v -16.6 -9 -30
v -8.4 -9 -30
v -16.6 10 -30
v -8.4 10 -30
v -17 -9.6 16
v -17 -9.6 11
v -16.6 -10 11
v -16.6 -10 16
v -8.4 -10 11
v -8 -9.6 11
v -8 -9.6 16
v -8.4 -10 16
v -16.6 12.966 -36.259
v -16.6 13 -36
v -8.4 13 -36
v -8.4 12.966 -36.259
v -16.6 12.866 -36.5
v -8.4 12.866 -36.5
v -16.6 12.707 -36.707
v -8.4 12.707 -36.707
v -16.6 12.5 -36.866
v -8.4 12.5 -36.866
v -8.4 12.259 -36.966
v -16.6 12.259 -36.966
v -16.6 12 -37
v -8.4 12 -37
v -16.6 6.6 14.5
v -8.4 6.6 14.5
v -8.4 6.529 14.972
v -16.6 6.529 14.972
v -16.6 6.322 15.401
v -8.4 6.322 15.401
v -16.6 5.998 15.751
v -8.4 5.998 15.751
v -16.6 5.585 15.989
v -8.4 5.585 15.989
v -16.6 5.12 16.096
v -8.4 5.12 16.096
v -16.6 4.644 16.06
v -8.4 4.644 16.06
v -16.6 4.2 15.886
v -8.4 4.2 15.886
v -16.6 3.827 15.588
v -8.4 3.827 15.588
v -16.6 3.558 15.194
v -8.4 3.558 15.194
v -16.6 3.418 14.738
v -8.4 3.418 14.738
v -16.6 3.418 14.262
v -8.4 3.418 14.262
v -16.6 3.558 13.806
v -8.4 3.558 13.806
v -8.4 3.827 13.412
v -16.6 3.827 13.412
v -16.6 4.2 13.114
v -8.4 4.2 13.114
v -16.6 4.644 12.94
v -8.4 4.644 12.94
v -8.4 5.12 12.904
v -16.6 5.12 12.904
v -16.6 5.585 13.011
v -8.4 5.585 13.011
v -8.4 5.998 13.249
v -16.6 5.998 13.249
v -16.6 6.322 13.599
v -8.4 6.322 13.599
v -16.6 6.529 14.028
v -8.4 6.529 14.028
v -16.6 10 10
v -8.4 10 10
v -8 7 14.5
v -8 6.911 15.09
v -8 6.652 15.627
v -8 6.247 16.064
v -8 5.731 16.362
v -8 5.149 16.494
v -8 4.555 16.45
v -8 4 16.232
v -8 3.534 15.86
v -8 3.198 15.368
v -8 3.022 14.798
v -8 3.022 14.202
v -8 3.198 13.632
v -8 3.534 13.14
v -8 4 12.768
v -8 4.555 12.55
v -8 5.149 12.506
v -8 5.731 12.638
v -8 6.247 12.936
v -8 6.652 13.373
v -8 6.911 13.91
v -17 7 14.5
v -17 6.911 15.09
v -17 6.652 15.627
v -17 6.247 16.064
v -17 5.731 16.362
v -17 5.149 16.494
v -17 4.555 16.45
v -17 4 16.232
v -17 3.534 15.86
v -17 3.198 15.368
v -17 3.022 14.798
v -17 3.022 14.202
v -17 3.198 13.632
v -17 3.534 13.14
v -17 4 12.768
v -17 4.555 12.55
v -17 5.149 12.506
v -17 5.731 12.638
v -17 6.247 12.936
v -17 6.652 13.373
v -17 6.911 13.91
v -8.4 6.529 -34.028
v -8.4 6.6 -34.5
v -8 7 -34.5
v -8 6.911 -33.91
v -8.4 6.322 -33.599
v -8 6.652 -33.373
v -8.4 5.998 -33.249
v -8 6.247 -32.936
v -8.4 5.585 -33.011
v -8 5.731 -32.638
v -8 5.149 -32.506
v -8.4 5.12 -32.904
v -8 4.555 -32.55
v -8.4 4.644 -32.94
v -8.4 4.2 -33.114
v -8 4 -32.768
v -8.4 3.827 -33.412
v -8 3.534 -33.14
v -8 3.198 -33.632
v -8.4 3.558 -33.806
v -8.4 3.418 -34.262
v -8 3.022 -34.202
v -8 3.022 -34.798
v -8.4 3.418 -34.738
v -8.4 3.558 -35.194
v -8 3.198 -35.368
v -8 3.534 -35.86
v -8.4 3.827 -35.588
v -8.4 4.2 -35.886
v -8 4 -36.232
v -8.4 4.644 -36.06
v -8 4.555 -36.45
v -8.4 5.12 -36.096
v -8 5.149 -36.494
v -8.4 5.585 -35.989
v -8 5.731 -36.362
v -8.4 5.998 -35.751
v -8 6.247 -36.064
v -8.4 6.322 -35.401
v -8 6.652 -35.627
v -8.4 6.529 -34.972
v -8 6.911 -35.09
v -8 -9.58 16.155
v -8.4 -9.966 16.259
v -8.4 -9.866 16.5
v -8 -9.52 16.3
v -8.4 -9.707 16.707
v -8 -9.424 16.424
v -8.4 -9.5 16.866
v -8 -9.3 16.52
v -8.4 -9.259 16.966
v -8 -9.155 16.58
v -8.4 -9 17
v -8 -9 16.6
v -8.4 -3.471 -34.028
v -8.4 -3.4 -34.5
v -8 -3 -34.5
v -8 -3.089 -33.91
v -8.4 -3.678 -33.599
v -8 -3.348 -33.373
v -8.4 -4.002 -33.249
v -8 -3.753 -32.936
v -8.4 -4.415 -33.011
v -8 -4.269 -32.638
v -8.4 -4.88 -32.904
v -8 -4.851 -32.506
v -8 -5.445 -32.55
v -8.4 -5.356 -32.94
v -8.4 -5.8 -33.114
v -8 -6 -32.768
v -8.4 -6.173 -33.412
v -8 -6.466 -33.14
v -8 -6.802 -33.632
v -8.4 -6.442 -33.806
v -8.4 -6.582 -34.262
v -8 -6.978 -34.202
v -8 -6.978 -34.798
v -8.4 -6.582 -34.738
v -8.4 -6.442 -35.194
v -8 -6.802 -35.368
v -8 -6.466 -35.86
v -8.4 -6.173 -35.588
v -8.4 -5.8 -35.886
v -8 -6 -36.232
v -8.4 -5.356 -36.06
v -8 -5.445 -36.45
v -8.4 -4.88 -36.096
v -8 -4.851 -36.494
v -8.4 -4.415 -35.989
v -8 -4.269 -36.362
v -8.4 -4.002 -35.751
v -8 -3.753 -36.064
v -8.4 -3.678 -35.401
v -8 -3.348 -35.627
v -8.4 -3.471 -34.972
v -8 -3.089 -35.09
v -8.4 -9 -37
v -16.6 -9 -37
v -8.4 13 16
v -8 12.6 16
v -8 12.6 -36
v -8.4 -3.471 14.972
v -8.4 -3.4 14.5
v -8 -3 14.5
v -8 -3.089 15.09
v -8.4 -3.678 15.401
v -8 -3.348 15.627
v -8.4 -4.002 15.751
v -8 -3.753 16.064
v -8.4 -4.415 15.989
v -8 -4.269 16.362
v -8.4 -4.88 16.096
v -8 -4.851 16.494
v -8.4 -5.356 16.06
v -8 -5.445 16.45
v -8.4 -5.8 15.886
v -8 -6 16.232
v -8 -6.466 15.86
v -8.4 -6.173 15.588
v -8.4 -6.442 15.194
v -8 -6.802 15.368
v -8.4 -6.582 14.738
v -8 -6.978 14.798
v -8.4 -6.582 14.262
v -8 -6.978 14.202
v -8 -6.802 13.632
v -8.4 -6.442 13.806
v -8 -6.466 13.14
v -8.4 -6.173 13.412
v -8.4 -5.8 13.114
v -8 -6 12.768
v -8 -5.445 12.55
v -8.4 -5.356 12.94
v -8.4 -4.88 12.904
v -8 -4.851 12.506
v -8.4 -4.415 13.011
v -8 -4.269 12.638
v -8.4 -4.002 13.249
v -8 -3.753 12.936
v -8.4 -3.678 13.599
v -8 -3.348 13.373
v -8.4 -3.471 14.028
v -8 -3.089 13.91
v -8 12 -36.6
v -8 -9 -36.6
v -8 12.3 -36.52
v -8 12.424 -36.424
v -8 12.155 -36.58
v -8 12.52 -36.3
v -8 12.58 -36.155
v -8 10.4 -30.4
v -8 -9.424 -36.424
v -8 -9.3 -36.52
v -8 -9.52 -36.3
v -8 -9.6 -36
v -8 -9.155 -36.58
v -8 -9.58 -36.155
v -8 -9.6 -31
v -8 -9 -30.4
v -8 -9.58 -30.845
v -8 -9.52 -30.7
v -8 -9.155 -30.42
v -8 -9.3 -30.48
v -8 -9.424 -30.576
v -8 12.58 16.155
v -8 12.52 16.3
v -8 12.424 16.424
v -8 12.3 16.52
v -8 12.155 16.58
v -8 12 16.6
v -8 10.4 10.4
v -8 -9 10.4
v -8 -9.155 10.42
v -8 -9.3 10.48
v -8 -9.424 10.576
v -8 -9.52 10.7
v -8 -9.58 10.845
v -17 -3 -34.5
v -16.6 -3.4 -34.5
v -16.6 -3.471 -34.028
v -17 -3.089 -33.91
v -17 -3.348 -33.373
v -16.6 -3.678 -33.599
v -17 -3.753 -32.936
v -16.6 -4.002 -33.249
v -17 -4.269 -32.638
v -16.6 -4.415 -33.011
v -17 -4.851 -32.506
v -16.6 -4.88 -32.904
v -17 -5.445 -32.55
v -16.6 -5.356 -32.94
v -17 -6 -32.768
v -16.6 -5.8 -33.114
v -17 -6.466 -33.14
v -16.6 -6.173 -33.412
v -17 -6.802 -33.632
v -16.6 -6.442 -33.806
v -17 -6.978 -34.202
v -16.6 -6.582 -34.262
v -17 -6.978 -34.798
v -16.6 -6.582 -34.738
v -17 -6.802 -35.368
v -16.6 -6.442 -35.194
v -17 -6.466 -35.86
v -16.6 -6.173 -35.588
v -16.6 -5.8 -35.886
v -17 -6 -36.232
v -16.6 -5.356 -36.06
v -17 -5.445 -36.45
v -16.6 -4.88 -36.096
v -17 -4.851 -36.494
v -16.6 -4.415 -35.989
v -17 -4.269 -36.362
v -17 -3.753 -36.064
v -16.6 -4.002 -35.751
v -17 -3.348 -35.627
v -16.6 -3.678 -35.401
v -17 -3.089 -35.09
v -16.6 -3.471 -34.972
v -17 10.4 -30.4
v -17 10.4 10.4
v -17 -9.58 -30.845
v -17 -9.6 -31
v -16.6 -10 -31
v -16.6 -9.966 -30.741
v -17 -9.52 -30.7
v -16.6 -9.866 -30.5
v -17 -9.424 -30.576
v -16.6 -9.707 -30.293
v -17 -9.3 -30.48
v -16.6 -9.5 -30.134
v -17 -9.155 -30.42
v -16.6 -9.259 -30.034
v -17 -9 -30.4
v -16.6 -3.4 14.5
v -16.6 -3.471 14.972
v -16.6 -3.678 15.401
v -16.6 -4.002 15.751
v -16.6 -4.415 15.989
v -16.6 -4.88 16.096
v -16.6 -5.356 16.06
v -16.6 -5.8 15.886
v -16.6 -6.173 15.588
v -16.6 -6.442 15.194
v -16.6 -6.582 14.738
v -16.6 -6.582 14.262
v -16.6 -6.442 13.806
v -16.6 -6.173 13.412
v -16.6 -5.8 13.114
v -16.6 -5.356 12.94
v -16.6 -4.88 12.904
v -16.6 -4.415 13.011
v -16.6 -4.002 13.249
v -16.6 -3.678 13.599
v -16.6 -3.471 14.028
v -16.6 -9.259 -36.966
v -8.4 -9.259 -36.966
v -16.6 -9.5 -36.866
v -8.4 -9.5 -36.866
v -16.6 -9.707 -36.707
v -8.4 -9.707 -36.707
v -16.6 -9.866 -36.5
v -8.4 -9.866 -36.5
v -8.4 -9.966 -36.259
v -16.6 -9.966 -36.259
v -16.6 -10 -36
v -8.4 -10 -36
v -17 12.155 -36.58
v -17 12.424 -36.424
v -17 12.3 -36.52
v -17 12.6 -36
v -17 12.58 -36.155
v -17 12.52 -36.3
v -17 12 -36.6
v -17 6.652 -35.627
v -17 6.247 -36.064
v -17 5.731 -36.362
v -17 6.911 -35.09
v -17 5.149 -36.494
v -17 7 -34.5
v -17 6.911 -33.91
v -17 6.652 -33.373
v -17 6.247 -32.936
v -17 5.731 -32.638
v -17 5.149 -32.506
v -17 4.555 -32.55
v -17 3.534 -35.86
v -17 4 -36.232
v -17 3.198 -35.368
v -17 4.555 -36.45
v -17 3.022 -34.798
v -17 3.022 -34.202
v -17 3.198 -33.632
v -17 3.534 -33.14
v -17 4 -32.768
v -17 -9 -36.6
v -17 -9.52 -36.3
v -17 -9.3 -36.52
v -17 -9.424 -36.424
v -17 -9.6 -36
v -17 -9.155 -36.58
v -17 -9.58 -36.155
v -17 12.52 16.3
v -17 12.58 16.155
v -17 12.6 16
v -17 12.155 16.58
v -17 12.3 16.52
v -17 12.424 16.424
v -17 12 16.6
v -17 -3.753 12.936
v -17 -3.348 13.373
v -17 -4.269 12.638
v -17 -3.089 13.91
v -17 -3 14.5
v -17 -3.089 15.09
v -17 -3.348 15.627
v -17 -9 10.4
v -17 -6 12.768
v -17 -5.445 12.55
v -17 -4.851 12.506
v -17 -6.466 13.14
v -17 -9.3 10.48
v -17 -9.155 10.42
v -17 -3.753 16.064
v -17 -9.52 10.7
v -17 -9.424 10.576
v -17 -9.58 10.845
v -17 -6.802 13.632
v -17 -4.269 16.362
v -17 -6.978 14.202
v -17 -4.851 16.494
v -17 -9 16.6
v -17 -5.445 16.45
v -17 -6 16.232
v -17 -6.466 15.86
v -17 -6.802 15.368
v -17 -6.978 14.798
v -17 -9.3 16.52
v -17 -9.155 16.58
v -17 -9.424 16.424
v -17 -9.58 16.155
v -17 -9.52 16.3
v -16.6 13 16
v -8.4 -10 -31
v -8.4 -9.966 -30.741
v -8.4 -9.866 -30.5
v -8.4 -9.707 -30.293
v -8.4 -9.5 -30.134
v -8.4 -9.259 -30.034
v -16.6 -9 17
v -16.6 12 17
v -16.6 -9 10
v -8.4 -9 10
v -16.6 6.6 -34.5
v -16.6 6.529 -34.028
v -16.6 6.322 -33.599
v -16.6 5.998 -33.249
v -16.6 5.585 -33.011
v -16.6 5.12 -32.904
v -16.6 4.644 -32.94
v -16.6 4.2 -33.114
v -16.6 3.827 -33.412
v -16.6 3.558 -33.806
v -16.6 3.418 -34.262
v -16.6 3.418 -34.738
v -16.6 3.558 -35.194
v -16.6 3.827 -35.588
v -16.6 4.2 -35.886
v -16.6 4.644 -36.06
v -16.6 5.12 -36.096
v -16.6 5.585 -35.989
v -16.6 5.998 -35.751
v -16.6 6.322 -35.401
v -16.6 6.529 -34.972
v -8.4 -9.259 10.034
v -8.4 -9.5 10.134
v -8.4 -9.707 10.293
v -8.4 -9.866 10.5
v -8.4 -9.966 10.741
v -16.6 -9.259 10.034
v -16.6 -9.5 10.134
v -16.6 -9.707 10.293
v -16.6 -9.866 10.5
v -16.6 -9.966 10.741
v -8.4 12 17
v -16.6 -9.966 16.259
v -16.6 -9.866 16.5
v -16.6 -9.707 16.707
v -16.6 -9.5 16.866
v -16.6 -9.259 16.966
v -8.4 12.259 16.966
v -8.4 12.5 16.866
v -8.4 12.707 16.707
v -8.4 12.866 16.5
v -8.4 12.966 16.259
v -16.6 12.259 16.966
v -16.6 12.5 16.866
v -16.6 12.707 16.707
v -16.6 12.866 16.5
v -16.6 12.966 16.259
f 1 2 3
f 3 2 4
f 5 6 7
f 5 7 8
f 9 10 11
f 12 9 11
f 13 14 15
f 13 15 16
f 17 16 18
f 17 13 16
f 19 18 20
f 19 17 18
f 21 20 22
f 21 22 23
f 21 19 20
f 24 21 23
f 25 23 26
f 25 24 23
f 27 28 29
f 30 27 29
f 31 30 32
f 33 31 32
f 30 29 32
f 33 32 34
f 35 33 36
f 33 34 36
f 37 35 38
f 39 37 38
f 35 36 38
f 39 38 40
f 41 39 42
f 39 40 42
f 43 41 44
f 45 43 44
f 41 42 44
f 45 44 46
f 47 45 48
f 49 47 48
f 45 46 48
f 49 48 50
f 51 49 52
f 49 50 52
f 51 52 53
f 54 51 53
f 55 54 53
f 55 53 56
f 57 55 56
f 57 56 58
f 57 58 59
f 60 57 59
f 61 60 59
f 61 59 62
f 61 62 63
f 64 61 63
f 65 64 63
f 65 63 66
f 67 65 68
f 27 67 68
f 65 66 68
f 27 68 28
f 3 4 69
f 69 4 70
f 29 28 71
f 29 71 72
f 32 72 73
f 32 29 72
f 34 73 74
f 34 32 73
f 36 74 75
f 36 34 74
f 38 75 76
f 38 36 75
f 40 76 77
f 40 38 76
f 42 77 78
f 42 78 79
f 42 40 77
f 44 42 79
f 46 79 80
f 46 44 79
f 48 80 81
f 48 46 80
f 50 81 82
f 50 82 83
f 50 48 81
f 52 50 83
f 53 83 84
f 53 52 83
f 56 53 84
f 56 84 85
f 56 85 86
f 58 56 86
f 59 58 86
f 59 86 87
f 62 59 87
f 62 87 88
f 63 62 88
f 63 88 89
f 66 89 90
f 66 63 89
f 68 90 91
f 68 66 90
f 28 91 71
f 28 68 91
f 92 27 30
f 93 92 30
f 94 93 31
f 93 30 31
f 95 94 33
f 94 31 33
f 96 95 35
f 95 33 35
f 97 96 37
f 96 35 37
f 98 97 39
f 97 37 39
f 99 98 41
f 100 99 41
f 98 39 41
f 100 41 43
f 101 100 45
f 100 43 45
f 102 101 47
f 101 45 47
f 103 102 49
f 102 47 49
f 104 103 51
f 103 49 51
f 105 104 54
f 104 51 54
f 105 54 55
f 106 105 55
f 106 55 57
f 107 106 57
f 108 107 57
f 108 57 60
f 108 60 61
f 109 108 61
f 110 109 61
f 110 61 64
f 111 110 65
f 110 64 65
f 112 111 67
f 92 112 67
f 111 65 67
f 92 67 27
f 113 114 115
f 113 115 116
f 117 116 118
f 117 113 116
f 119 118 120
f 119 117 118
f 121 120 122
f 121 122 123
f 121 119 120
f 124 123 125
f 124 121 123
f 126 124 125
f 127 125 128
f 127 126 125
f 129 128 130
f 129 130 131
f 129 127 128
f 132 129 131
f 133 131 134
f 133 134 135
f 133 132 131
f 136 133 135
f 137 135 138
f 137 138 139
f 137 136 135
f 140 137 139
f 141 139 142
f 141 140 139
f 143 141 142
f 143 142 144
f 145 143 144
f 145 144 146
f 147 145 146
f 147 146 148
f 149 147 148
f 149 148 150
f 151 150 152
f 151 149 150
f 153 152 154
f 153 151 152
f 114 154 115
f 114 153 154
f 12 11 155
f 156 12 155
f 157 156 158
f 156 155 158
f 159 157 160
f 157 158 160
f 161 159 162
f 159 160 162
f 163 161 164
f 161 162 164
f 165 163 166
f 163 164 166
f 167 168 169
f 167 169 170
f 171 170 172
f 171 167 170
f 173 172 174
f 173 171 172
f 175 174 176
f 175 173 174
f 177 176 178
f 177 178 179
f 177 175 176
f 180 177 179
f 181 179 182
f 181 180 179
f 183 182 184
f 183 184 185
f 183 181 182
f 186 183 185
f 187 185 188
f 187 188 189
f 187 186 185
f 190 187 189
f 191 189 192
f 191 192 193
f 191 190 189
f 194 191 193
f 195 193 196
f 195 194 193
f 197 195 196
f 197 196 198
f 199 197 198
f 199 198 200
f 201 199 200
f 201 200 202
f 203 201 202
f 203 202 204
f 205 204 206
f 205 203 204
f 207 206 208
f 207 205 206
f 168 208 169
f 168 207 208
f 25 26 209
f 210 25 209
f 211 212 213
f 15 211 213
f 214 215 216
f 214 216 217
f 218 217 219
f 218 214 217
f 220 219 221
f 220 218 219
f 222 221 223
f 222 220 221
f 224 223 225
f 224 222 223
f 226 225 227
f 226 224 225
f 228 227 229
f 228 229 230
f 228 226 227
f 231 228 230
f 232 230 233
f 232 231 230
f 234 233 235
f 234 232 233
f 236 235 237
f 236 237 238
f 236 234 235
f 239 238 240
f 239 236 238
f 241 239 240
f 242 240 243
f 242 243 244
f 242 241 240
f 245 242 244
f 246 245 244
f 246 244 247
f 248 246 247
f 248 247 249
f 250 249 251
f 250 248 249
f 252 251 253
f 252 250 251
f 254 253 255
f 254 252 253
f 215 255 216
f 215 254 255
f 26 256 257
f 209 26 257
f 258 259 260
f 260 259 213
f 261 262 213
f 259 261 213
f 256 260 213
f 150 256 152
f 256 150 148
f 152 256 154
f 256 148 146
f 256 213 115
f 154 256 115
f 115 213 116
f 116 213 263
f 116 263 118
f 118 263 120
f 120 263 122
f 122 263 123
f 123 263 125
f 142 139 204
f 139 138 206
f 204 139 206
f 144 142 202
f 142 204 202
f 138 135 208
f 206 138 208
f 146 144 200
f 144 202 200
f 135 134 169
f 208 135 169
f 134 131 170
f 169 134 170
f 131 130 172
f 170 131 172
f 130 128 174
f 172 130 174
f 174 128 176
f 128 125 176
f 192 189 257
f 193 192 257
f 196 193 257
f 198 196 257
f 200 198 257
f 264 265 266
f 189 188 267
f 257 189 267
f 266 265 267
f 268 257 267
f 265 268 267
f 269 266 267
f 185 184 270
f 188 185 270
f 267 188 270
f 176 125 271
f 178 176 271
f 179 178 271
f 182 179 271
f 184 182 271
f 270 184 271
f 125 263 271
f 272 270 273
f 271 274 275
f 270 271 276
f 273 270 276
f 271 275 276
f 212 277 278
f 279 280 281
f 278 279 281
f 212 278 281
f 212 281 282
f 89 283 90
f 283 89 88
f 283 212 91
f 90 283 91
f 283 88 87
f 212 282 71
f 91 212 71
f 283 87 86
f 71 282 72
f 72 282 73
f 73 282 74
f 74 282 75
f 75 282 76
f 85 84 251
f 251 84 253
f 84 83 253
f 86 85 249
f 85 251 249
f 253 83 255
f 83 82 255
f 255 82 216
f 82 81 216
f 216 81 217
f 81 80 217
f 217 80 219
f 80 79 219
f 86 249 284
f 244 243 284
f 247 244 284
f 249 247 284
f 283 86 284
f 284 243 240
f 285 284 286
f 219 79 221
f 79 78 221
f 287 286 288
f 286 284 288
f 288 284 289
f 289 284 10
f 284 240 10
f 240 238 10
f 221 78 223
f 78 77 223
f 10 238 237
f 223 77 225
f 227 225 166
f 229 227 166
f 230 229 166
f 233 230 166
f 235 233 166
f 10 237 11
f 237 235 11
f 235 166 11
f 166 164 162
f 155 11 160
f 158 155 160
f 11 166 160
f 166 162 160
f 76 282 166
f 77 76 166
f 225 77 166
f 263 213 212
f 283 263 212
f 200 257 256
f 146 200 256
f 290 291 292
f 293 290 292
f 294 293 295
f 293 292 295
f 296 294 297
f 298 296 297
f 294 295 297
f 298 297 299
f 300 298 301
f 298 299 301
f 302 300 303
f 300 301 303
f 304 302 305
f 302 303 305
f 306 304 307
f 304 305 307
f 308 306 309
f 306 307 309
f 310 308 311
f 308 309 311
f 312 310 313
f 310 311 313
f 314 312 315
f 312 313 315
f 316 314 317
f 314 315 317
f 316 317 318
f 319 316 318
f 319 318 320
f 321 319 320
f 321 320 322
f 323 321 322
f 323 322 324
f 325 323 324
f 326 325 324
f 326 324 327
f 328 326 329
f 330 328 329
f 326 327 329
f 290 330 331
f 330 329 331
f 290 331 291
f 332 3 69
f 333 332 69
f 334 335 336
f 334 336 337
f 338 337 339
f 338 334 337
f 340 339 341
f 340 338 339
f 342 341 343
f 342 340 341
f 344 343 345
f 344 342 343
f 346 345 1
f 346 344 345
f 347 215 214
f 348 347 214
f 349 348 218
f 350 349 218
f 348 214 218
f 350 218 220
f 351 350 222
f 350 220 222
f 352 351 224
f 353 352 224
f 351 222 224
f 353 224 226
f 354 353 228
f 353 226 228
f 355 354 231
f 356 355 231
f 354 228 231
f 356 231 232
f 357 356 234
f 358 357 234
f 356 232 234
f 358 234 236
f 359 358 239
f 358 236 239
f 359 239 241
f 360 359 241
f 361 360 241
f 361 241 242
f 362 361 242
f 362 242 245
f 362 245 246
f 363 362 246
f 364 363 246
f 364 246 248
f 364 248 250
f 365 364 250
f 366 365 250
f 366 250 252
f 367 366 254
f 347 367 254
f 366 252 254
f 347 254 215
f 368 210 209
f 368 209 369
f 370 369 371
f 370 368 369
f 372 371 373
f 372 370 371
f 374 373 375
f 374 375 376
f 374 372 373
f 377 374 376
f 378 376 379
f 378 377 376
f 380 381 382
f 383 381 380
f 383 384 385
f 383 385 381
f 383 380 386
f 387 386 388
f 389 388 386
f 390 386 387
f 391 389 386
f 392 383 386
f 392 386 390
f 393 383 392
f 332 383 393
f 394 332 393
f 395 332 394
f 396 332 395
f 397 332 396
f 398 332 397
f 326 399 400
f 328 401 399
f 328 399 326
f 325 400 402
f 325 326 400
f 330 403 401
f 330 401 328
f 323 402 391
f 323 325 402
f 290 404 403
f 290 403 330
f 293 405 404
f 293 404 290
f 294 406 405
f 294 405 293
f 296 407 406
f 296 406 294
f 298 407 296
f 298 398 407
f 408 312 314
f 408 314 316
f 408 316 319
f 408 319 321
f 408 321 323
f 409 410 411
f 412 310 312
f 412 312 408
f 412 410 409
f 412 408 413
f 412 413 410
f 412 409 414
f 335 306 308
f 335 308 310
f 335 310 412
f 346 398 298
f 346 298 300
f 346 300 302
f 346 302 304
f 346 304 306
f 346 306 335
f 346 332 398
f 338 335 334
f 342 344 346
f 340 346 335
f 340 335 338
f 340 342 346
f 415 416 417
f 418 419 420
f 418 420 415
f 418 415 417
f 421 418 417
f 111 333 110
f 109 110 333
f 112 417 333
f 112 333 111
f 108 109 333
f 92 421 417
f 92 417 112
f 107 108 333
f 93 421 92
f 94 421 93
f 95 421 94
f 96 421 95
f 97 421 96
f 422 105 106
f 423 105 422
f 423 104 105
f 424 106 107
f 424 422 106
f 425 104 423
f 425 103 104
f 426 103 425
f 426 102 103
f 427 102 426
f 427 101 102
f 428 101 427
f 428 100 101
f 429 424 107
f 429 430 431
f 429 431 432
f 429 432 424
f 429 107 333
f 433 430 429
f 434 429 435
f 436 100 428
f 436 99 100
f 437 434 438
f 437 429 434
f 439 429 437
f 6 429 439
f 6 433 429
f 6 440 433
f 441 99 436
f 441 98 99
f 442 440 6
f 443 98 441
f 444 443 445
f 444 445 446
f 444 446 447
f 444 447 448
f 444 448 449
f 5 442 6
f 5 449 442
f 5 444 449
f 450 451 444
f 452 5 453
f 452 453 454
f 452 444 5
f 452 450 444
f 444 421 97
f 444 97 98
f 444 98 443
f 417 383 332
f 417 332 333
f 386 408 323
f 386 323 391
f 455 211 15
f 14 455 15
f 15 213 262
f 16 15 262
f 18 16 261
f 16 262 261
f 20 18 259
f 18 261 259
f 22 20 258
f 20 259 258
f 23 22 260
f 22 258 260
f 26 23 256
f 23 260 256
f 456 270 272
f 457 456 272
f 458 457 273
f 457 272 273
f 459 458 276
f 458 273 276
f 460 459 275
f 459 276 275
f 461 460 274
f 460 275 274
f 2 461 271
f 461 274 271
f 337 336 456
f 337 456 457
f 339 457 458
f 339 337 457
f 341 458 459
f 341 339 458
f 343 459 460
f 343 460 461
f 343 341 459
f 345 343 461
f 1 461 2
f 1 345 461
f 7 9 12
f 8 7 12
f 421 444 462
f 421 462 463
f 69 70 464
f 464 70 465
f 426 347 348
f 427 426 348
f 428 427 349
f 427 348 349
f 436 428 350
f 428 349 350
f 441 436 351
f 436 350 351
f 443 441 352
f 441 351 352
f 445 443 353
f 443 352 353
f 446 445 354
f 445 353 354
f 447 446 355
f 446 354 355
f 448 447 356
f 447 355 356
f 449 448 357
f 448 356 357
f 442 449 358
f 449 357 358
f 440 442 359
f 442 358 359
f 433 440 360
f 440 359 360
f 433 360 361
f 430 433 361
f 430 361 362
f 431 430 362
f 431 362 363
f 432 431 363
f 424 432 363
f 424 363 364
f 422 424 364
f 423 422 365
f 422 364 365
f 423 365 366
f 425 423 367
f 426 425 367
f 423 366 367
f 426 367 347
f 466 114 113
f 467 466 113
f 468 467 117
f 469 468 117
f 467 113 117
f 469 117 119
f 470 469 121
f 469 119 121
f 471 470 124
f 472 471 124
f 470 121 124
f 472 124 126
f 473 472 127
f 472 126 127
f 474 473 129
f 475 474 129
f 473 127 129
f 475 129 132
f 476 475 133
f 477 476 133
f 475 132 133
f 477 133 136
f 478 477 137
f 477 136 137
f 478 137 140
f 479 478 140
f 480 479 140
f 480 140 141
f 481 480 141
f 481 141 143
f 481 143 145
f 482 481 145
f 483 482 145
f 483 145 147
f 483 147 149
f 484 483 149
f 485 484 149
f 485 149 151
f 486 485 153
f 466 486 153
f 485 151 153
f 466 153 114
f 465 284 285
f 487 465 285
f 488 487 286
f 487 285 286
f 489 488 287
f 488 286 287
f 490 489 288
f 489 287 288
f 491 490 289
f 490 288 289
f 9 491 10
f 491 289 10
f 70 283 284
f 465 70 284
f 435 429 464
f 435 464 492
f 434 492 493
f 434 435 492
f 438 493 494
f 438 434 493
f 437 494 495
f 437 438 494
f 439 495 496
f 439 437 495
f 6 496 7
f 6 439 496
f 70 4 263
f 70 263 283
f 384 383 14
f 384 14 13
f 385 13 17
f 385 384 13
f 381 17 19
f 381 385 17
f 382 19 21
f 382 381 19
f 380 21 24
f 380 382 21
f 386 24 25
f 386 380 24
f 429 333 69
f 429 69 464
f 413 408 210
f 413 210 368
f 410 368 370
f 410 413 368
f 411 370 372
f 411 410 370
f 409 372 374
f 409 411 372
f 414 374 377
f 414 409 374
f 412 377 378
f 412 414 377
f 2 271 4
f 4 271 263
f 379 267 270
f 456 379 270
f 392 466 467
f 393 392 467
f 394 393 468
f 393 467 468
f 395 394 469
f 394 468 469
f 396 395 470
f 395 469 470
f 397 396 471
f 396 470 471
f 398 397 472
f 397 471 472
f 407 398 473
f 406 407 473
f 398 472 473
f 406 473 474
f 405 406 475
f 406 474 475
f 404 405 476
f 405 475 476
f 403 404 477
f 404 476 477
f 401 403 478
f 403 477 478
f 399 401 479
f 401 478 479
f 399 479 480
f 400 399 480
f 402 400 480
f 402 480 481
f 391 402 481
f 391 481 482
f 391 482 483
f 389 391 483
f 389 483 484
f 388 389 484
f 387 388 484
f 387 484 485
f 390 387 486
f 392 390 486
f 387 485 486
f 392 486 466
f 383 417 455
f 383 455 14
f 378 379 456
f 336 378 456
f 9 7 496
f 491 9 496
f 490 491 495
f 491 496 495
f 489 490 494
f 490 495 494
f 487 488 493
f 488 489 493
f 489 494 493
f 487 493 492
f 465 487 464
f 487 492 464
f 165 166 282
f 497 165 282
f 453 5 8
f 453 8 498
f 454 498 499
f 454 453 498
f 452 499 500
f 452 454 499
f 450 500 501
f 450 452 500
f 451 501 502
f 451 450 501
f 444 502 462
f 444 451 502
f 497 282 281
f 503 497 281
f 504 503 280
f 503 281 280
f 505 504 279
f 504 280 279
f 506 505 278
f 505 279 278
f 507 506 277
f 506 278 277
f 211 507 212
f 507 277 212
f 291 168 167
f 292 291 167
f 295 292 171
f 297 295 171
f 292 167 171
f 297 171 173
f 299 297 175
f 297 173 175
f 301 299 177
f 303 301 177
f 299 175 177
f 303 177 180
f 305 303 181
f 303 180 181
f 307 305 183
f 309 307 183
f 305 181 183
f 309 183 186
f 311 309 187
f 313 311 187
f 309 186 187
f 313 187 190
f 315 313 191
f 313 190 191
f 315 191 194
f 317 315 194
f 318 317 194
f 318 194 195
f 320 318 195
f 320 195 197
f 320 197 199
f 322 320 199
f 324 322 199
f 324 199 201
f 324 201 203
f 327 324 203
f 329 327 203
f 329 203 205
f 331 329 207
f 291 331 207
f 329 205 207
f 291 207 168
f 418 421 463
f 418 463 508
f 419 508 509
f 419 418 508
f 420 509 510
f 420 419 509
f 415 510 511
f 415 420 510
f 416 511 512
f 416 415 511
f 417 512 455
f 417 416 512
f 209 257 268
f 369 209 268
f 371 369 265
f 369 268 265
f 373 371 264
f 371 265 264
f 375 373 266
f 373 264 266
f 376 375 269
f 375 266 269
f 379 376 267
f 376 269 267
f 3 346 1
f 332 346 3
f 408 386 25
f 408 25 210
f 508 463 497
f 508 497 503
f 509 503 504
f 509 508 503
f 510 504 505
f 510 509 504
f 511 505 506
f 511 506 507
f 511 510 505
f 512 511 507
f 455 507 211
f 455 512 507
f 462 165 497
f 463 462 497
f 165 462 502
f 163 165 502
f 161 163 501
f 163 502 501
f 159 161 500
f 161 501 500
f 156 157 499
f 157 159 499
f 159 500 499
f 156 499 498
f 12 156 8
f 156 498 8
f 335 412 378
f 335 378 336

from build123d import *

# Parameters (mm, degrees)
SKETCH044_R     = 1.6
PAD025_DEPTH    = 9
FILLET013_R     = 1
CHAMFER007_SIZE = 0.4


with BuildPart() as part:
    # Sketch044 → Pad025 (new body)
    with BuildSketch(Plane.YZ):
        Polygon((-10, 17), (13, 17), (13, -37), (-10, -37), (-10, -30), (10, -30), (10, 10), (-10, 10), align=None)
        with Locations((-5, 14.5)):
            Circle(SKETCH044_R, mode=Mode.SUBTRACT)
        with Locations((5, 14.5)):
            Circle(SKETCH044_R, mode=Mode.SUBTRACT)
        with Locations((-5, -34.5)):
            Circle(SKETCH044_R, mode=Mode.SUBTRACT)
        with Locations((5, -34.5)):
            Circle(SKETCH044_R, mode=Mode.SUBTRACT)
    extrude(amount=-PAD025_DEPTH)

    # Fillet013
    fillet013_edges = [part.edges().sort_by_distance(p)[0] for p in [
        (-4.5, -10, 17),
        (-4.5, -10, 10),
        (-4.5, -10, -30),
        (-4.5, -10, -37),
        (-4.5, 13, -37),
        (-4.5, 13, 17),
    ]]
    fillet(fillet013_edges, radius=FILLET013_R)

    # Chamfer007
    chamfer007_edges = [part.edges().sort_by_distance(p)[0] for p in [
        (0, 1.5, 17),
        (0, -9.707107, 16.707107),
        (0, 12.707107, 16.707107),
        (0, -10, 13.5),
        (0, 13, -10),
        (0, -9.707107, 10.292893),
        (0, 12.707107, -36.707107),
        (0, 0.5, 10),
        (0, 1.5, -37),
        (0, 10, -10),
        (0, -9.707107, -36.707107),
        (0, 0.5, -30),
        (0, -10, -33.5),
        (0, -9.707107, -30.292893),
        (0, -6.6, 14.5),
        (0, 3.4, 14.5),
        (0, -6.6, -34.5),
        (0, 3.4, -34.5),
        (-9, 1.5, 17),
        (-9, -9.707107, 16.707107),
        (-9, 12.707107, 16.707107),
        (-9, -10, 13.5),
        (-9, 13, -10),
        (-9, -9.707107, 10.292893),
        (-9, 12.707107, -36.707107),
        (-9, 0.5, 10),
        (-9, 1.5, -37),
        (-9, 10, -10),
        (-9, -9.707107, -36.707107),
        (-9, 0.5, -30),
        (-9, -10, -33.5),
        (-9, -9.707107, -30.292893),
        (-9, -6.6, 14.5),
        (-9, 3.4, 14.5),
        (-9, -6.6, -34.5),
        (-9, 3.4, -34.5),
    ]]
    chamfer(chamfer007_edges, length=CHAMFER007_SIZE)


with BuildPart() as part_1:
    # Body025 placement: moved
    add(part.part.moved(Location((-8, 0, 0))))


solid = part_1.part
